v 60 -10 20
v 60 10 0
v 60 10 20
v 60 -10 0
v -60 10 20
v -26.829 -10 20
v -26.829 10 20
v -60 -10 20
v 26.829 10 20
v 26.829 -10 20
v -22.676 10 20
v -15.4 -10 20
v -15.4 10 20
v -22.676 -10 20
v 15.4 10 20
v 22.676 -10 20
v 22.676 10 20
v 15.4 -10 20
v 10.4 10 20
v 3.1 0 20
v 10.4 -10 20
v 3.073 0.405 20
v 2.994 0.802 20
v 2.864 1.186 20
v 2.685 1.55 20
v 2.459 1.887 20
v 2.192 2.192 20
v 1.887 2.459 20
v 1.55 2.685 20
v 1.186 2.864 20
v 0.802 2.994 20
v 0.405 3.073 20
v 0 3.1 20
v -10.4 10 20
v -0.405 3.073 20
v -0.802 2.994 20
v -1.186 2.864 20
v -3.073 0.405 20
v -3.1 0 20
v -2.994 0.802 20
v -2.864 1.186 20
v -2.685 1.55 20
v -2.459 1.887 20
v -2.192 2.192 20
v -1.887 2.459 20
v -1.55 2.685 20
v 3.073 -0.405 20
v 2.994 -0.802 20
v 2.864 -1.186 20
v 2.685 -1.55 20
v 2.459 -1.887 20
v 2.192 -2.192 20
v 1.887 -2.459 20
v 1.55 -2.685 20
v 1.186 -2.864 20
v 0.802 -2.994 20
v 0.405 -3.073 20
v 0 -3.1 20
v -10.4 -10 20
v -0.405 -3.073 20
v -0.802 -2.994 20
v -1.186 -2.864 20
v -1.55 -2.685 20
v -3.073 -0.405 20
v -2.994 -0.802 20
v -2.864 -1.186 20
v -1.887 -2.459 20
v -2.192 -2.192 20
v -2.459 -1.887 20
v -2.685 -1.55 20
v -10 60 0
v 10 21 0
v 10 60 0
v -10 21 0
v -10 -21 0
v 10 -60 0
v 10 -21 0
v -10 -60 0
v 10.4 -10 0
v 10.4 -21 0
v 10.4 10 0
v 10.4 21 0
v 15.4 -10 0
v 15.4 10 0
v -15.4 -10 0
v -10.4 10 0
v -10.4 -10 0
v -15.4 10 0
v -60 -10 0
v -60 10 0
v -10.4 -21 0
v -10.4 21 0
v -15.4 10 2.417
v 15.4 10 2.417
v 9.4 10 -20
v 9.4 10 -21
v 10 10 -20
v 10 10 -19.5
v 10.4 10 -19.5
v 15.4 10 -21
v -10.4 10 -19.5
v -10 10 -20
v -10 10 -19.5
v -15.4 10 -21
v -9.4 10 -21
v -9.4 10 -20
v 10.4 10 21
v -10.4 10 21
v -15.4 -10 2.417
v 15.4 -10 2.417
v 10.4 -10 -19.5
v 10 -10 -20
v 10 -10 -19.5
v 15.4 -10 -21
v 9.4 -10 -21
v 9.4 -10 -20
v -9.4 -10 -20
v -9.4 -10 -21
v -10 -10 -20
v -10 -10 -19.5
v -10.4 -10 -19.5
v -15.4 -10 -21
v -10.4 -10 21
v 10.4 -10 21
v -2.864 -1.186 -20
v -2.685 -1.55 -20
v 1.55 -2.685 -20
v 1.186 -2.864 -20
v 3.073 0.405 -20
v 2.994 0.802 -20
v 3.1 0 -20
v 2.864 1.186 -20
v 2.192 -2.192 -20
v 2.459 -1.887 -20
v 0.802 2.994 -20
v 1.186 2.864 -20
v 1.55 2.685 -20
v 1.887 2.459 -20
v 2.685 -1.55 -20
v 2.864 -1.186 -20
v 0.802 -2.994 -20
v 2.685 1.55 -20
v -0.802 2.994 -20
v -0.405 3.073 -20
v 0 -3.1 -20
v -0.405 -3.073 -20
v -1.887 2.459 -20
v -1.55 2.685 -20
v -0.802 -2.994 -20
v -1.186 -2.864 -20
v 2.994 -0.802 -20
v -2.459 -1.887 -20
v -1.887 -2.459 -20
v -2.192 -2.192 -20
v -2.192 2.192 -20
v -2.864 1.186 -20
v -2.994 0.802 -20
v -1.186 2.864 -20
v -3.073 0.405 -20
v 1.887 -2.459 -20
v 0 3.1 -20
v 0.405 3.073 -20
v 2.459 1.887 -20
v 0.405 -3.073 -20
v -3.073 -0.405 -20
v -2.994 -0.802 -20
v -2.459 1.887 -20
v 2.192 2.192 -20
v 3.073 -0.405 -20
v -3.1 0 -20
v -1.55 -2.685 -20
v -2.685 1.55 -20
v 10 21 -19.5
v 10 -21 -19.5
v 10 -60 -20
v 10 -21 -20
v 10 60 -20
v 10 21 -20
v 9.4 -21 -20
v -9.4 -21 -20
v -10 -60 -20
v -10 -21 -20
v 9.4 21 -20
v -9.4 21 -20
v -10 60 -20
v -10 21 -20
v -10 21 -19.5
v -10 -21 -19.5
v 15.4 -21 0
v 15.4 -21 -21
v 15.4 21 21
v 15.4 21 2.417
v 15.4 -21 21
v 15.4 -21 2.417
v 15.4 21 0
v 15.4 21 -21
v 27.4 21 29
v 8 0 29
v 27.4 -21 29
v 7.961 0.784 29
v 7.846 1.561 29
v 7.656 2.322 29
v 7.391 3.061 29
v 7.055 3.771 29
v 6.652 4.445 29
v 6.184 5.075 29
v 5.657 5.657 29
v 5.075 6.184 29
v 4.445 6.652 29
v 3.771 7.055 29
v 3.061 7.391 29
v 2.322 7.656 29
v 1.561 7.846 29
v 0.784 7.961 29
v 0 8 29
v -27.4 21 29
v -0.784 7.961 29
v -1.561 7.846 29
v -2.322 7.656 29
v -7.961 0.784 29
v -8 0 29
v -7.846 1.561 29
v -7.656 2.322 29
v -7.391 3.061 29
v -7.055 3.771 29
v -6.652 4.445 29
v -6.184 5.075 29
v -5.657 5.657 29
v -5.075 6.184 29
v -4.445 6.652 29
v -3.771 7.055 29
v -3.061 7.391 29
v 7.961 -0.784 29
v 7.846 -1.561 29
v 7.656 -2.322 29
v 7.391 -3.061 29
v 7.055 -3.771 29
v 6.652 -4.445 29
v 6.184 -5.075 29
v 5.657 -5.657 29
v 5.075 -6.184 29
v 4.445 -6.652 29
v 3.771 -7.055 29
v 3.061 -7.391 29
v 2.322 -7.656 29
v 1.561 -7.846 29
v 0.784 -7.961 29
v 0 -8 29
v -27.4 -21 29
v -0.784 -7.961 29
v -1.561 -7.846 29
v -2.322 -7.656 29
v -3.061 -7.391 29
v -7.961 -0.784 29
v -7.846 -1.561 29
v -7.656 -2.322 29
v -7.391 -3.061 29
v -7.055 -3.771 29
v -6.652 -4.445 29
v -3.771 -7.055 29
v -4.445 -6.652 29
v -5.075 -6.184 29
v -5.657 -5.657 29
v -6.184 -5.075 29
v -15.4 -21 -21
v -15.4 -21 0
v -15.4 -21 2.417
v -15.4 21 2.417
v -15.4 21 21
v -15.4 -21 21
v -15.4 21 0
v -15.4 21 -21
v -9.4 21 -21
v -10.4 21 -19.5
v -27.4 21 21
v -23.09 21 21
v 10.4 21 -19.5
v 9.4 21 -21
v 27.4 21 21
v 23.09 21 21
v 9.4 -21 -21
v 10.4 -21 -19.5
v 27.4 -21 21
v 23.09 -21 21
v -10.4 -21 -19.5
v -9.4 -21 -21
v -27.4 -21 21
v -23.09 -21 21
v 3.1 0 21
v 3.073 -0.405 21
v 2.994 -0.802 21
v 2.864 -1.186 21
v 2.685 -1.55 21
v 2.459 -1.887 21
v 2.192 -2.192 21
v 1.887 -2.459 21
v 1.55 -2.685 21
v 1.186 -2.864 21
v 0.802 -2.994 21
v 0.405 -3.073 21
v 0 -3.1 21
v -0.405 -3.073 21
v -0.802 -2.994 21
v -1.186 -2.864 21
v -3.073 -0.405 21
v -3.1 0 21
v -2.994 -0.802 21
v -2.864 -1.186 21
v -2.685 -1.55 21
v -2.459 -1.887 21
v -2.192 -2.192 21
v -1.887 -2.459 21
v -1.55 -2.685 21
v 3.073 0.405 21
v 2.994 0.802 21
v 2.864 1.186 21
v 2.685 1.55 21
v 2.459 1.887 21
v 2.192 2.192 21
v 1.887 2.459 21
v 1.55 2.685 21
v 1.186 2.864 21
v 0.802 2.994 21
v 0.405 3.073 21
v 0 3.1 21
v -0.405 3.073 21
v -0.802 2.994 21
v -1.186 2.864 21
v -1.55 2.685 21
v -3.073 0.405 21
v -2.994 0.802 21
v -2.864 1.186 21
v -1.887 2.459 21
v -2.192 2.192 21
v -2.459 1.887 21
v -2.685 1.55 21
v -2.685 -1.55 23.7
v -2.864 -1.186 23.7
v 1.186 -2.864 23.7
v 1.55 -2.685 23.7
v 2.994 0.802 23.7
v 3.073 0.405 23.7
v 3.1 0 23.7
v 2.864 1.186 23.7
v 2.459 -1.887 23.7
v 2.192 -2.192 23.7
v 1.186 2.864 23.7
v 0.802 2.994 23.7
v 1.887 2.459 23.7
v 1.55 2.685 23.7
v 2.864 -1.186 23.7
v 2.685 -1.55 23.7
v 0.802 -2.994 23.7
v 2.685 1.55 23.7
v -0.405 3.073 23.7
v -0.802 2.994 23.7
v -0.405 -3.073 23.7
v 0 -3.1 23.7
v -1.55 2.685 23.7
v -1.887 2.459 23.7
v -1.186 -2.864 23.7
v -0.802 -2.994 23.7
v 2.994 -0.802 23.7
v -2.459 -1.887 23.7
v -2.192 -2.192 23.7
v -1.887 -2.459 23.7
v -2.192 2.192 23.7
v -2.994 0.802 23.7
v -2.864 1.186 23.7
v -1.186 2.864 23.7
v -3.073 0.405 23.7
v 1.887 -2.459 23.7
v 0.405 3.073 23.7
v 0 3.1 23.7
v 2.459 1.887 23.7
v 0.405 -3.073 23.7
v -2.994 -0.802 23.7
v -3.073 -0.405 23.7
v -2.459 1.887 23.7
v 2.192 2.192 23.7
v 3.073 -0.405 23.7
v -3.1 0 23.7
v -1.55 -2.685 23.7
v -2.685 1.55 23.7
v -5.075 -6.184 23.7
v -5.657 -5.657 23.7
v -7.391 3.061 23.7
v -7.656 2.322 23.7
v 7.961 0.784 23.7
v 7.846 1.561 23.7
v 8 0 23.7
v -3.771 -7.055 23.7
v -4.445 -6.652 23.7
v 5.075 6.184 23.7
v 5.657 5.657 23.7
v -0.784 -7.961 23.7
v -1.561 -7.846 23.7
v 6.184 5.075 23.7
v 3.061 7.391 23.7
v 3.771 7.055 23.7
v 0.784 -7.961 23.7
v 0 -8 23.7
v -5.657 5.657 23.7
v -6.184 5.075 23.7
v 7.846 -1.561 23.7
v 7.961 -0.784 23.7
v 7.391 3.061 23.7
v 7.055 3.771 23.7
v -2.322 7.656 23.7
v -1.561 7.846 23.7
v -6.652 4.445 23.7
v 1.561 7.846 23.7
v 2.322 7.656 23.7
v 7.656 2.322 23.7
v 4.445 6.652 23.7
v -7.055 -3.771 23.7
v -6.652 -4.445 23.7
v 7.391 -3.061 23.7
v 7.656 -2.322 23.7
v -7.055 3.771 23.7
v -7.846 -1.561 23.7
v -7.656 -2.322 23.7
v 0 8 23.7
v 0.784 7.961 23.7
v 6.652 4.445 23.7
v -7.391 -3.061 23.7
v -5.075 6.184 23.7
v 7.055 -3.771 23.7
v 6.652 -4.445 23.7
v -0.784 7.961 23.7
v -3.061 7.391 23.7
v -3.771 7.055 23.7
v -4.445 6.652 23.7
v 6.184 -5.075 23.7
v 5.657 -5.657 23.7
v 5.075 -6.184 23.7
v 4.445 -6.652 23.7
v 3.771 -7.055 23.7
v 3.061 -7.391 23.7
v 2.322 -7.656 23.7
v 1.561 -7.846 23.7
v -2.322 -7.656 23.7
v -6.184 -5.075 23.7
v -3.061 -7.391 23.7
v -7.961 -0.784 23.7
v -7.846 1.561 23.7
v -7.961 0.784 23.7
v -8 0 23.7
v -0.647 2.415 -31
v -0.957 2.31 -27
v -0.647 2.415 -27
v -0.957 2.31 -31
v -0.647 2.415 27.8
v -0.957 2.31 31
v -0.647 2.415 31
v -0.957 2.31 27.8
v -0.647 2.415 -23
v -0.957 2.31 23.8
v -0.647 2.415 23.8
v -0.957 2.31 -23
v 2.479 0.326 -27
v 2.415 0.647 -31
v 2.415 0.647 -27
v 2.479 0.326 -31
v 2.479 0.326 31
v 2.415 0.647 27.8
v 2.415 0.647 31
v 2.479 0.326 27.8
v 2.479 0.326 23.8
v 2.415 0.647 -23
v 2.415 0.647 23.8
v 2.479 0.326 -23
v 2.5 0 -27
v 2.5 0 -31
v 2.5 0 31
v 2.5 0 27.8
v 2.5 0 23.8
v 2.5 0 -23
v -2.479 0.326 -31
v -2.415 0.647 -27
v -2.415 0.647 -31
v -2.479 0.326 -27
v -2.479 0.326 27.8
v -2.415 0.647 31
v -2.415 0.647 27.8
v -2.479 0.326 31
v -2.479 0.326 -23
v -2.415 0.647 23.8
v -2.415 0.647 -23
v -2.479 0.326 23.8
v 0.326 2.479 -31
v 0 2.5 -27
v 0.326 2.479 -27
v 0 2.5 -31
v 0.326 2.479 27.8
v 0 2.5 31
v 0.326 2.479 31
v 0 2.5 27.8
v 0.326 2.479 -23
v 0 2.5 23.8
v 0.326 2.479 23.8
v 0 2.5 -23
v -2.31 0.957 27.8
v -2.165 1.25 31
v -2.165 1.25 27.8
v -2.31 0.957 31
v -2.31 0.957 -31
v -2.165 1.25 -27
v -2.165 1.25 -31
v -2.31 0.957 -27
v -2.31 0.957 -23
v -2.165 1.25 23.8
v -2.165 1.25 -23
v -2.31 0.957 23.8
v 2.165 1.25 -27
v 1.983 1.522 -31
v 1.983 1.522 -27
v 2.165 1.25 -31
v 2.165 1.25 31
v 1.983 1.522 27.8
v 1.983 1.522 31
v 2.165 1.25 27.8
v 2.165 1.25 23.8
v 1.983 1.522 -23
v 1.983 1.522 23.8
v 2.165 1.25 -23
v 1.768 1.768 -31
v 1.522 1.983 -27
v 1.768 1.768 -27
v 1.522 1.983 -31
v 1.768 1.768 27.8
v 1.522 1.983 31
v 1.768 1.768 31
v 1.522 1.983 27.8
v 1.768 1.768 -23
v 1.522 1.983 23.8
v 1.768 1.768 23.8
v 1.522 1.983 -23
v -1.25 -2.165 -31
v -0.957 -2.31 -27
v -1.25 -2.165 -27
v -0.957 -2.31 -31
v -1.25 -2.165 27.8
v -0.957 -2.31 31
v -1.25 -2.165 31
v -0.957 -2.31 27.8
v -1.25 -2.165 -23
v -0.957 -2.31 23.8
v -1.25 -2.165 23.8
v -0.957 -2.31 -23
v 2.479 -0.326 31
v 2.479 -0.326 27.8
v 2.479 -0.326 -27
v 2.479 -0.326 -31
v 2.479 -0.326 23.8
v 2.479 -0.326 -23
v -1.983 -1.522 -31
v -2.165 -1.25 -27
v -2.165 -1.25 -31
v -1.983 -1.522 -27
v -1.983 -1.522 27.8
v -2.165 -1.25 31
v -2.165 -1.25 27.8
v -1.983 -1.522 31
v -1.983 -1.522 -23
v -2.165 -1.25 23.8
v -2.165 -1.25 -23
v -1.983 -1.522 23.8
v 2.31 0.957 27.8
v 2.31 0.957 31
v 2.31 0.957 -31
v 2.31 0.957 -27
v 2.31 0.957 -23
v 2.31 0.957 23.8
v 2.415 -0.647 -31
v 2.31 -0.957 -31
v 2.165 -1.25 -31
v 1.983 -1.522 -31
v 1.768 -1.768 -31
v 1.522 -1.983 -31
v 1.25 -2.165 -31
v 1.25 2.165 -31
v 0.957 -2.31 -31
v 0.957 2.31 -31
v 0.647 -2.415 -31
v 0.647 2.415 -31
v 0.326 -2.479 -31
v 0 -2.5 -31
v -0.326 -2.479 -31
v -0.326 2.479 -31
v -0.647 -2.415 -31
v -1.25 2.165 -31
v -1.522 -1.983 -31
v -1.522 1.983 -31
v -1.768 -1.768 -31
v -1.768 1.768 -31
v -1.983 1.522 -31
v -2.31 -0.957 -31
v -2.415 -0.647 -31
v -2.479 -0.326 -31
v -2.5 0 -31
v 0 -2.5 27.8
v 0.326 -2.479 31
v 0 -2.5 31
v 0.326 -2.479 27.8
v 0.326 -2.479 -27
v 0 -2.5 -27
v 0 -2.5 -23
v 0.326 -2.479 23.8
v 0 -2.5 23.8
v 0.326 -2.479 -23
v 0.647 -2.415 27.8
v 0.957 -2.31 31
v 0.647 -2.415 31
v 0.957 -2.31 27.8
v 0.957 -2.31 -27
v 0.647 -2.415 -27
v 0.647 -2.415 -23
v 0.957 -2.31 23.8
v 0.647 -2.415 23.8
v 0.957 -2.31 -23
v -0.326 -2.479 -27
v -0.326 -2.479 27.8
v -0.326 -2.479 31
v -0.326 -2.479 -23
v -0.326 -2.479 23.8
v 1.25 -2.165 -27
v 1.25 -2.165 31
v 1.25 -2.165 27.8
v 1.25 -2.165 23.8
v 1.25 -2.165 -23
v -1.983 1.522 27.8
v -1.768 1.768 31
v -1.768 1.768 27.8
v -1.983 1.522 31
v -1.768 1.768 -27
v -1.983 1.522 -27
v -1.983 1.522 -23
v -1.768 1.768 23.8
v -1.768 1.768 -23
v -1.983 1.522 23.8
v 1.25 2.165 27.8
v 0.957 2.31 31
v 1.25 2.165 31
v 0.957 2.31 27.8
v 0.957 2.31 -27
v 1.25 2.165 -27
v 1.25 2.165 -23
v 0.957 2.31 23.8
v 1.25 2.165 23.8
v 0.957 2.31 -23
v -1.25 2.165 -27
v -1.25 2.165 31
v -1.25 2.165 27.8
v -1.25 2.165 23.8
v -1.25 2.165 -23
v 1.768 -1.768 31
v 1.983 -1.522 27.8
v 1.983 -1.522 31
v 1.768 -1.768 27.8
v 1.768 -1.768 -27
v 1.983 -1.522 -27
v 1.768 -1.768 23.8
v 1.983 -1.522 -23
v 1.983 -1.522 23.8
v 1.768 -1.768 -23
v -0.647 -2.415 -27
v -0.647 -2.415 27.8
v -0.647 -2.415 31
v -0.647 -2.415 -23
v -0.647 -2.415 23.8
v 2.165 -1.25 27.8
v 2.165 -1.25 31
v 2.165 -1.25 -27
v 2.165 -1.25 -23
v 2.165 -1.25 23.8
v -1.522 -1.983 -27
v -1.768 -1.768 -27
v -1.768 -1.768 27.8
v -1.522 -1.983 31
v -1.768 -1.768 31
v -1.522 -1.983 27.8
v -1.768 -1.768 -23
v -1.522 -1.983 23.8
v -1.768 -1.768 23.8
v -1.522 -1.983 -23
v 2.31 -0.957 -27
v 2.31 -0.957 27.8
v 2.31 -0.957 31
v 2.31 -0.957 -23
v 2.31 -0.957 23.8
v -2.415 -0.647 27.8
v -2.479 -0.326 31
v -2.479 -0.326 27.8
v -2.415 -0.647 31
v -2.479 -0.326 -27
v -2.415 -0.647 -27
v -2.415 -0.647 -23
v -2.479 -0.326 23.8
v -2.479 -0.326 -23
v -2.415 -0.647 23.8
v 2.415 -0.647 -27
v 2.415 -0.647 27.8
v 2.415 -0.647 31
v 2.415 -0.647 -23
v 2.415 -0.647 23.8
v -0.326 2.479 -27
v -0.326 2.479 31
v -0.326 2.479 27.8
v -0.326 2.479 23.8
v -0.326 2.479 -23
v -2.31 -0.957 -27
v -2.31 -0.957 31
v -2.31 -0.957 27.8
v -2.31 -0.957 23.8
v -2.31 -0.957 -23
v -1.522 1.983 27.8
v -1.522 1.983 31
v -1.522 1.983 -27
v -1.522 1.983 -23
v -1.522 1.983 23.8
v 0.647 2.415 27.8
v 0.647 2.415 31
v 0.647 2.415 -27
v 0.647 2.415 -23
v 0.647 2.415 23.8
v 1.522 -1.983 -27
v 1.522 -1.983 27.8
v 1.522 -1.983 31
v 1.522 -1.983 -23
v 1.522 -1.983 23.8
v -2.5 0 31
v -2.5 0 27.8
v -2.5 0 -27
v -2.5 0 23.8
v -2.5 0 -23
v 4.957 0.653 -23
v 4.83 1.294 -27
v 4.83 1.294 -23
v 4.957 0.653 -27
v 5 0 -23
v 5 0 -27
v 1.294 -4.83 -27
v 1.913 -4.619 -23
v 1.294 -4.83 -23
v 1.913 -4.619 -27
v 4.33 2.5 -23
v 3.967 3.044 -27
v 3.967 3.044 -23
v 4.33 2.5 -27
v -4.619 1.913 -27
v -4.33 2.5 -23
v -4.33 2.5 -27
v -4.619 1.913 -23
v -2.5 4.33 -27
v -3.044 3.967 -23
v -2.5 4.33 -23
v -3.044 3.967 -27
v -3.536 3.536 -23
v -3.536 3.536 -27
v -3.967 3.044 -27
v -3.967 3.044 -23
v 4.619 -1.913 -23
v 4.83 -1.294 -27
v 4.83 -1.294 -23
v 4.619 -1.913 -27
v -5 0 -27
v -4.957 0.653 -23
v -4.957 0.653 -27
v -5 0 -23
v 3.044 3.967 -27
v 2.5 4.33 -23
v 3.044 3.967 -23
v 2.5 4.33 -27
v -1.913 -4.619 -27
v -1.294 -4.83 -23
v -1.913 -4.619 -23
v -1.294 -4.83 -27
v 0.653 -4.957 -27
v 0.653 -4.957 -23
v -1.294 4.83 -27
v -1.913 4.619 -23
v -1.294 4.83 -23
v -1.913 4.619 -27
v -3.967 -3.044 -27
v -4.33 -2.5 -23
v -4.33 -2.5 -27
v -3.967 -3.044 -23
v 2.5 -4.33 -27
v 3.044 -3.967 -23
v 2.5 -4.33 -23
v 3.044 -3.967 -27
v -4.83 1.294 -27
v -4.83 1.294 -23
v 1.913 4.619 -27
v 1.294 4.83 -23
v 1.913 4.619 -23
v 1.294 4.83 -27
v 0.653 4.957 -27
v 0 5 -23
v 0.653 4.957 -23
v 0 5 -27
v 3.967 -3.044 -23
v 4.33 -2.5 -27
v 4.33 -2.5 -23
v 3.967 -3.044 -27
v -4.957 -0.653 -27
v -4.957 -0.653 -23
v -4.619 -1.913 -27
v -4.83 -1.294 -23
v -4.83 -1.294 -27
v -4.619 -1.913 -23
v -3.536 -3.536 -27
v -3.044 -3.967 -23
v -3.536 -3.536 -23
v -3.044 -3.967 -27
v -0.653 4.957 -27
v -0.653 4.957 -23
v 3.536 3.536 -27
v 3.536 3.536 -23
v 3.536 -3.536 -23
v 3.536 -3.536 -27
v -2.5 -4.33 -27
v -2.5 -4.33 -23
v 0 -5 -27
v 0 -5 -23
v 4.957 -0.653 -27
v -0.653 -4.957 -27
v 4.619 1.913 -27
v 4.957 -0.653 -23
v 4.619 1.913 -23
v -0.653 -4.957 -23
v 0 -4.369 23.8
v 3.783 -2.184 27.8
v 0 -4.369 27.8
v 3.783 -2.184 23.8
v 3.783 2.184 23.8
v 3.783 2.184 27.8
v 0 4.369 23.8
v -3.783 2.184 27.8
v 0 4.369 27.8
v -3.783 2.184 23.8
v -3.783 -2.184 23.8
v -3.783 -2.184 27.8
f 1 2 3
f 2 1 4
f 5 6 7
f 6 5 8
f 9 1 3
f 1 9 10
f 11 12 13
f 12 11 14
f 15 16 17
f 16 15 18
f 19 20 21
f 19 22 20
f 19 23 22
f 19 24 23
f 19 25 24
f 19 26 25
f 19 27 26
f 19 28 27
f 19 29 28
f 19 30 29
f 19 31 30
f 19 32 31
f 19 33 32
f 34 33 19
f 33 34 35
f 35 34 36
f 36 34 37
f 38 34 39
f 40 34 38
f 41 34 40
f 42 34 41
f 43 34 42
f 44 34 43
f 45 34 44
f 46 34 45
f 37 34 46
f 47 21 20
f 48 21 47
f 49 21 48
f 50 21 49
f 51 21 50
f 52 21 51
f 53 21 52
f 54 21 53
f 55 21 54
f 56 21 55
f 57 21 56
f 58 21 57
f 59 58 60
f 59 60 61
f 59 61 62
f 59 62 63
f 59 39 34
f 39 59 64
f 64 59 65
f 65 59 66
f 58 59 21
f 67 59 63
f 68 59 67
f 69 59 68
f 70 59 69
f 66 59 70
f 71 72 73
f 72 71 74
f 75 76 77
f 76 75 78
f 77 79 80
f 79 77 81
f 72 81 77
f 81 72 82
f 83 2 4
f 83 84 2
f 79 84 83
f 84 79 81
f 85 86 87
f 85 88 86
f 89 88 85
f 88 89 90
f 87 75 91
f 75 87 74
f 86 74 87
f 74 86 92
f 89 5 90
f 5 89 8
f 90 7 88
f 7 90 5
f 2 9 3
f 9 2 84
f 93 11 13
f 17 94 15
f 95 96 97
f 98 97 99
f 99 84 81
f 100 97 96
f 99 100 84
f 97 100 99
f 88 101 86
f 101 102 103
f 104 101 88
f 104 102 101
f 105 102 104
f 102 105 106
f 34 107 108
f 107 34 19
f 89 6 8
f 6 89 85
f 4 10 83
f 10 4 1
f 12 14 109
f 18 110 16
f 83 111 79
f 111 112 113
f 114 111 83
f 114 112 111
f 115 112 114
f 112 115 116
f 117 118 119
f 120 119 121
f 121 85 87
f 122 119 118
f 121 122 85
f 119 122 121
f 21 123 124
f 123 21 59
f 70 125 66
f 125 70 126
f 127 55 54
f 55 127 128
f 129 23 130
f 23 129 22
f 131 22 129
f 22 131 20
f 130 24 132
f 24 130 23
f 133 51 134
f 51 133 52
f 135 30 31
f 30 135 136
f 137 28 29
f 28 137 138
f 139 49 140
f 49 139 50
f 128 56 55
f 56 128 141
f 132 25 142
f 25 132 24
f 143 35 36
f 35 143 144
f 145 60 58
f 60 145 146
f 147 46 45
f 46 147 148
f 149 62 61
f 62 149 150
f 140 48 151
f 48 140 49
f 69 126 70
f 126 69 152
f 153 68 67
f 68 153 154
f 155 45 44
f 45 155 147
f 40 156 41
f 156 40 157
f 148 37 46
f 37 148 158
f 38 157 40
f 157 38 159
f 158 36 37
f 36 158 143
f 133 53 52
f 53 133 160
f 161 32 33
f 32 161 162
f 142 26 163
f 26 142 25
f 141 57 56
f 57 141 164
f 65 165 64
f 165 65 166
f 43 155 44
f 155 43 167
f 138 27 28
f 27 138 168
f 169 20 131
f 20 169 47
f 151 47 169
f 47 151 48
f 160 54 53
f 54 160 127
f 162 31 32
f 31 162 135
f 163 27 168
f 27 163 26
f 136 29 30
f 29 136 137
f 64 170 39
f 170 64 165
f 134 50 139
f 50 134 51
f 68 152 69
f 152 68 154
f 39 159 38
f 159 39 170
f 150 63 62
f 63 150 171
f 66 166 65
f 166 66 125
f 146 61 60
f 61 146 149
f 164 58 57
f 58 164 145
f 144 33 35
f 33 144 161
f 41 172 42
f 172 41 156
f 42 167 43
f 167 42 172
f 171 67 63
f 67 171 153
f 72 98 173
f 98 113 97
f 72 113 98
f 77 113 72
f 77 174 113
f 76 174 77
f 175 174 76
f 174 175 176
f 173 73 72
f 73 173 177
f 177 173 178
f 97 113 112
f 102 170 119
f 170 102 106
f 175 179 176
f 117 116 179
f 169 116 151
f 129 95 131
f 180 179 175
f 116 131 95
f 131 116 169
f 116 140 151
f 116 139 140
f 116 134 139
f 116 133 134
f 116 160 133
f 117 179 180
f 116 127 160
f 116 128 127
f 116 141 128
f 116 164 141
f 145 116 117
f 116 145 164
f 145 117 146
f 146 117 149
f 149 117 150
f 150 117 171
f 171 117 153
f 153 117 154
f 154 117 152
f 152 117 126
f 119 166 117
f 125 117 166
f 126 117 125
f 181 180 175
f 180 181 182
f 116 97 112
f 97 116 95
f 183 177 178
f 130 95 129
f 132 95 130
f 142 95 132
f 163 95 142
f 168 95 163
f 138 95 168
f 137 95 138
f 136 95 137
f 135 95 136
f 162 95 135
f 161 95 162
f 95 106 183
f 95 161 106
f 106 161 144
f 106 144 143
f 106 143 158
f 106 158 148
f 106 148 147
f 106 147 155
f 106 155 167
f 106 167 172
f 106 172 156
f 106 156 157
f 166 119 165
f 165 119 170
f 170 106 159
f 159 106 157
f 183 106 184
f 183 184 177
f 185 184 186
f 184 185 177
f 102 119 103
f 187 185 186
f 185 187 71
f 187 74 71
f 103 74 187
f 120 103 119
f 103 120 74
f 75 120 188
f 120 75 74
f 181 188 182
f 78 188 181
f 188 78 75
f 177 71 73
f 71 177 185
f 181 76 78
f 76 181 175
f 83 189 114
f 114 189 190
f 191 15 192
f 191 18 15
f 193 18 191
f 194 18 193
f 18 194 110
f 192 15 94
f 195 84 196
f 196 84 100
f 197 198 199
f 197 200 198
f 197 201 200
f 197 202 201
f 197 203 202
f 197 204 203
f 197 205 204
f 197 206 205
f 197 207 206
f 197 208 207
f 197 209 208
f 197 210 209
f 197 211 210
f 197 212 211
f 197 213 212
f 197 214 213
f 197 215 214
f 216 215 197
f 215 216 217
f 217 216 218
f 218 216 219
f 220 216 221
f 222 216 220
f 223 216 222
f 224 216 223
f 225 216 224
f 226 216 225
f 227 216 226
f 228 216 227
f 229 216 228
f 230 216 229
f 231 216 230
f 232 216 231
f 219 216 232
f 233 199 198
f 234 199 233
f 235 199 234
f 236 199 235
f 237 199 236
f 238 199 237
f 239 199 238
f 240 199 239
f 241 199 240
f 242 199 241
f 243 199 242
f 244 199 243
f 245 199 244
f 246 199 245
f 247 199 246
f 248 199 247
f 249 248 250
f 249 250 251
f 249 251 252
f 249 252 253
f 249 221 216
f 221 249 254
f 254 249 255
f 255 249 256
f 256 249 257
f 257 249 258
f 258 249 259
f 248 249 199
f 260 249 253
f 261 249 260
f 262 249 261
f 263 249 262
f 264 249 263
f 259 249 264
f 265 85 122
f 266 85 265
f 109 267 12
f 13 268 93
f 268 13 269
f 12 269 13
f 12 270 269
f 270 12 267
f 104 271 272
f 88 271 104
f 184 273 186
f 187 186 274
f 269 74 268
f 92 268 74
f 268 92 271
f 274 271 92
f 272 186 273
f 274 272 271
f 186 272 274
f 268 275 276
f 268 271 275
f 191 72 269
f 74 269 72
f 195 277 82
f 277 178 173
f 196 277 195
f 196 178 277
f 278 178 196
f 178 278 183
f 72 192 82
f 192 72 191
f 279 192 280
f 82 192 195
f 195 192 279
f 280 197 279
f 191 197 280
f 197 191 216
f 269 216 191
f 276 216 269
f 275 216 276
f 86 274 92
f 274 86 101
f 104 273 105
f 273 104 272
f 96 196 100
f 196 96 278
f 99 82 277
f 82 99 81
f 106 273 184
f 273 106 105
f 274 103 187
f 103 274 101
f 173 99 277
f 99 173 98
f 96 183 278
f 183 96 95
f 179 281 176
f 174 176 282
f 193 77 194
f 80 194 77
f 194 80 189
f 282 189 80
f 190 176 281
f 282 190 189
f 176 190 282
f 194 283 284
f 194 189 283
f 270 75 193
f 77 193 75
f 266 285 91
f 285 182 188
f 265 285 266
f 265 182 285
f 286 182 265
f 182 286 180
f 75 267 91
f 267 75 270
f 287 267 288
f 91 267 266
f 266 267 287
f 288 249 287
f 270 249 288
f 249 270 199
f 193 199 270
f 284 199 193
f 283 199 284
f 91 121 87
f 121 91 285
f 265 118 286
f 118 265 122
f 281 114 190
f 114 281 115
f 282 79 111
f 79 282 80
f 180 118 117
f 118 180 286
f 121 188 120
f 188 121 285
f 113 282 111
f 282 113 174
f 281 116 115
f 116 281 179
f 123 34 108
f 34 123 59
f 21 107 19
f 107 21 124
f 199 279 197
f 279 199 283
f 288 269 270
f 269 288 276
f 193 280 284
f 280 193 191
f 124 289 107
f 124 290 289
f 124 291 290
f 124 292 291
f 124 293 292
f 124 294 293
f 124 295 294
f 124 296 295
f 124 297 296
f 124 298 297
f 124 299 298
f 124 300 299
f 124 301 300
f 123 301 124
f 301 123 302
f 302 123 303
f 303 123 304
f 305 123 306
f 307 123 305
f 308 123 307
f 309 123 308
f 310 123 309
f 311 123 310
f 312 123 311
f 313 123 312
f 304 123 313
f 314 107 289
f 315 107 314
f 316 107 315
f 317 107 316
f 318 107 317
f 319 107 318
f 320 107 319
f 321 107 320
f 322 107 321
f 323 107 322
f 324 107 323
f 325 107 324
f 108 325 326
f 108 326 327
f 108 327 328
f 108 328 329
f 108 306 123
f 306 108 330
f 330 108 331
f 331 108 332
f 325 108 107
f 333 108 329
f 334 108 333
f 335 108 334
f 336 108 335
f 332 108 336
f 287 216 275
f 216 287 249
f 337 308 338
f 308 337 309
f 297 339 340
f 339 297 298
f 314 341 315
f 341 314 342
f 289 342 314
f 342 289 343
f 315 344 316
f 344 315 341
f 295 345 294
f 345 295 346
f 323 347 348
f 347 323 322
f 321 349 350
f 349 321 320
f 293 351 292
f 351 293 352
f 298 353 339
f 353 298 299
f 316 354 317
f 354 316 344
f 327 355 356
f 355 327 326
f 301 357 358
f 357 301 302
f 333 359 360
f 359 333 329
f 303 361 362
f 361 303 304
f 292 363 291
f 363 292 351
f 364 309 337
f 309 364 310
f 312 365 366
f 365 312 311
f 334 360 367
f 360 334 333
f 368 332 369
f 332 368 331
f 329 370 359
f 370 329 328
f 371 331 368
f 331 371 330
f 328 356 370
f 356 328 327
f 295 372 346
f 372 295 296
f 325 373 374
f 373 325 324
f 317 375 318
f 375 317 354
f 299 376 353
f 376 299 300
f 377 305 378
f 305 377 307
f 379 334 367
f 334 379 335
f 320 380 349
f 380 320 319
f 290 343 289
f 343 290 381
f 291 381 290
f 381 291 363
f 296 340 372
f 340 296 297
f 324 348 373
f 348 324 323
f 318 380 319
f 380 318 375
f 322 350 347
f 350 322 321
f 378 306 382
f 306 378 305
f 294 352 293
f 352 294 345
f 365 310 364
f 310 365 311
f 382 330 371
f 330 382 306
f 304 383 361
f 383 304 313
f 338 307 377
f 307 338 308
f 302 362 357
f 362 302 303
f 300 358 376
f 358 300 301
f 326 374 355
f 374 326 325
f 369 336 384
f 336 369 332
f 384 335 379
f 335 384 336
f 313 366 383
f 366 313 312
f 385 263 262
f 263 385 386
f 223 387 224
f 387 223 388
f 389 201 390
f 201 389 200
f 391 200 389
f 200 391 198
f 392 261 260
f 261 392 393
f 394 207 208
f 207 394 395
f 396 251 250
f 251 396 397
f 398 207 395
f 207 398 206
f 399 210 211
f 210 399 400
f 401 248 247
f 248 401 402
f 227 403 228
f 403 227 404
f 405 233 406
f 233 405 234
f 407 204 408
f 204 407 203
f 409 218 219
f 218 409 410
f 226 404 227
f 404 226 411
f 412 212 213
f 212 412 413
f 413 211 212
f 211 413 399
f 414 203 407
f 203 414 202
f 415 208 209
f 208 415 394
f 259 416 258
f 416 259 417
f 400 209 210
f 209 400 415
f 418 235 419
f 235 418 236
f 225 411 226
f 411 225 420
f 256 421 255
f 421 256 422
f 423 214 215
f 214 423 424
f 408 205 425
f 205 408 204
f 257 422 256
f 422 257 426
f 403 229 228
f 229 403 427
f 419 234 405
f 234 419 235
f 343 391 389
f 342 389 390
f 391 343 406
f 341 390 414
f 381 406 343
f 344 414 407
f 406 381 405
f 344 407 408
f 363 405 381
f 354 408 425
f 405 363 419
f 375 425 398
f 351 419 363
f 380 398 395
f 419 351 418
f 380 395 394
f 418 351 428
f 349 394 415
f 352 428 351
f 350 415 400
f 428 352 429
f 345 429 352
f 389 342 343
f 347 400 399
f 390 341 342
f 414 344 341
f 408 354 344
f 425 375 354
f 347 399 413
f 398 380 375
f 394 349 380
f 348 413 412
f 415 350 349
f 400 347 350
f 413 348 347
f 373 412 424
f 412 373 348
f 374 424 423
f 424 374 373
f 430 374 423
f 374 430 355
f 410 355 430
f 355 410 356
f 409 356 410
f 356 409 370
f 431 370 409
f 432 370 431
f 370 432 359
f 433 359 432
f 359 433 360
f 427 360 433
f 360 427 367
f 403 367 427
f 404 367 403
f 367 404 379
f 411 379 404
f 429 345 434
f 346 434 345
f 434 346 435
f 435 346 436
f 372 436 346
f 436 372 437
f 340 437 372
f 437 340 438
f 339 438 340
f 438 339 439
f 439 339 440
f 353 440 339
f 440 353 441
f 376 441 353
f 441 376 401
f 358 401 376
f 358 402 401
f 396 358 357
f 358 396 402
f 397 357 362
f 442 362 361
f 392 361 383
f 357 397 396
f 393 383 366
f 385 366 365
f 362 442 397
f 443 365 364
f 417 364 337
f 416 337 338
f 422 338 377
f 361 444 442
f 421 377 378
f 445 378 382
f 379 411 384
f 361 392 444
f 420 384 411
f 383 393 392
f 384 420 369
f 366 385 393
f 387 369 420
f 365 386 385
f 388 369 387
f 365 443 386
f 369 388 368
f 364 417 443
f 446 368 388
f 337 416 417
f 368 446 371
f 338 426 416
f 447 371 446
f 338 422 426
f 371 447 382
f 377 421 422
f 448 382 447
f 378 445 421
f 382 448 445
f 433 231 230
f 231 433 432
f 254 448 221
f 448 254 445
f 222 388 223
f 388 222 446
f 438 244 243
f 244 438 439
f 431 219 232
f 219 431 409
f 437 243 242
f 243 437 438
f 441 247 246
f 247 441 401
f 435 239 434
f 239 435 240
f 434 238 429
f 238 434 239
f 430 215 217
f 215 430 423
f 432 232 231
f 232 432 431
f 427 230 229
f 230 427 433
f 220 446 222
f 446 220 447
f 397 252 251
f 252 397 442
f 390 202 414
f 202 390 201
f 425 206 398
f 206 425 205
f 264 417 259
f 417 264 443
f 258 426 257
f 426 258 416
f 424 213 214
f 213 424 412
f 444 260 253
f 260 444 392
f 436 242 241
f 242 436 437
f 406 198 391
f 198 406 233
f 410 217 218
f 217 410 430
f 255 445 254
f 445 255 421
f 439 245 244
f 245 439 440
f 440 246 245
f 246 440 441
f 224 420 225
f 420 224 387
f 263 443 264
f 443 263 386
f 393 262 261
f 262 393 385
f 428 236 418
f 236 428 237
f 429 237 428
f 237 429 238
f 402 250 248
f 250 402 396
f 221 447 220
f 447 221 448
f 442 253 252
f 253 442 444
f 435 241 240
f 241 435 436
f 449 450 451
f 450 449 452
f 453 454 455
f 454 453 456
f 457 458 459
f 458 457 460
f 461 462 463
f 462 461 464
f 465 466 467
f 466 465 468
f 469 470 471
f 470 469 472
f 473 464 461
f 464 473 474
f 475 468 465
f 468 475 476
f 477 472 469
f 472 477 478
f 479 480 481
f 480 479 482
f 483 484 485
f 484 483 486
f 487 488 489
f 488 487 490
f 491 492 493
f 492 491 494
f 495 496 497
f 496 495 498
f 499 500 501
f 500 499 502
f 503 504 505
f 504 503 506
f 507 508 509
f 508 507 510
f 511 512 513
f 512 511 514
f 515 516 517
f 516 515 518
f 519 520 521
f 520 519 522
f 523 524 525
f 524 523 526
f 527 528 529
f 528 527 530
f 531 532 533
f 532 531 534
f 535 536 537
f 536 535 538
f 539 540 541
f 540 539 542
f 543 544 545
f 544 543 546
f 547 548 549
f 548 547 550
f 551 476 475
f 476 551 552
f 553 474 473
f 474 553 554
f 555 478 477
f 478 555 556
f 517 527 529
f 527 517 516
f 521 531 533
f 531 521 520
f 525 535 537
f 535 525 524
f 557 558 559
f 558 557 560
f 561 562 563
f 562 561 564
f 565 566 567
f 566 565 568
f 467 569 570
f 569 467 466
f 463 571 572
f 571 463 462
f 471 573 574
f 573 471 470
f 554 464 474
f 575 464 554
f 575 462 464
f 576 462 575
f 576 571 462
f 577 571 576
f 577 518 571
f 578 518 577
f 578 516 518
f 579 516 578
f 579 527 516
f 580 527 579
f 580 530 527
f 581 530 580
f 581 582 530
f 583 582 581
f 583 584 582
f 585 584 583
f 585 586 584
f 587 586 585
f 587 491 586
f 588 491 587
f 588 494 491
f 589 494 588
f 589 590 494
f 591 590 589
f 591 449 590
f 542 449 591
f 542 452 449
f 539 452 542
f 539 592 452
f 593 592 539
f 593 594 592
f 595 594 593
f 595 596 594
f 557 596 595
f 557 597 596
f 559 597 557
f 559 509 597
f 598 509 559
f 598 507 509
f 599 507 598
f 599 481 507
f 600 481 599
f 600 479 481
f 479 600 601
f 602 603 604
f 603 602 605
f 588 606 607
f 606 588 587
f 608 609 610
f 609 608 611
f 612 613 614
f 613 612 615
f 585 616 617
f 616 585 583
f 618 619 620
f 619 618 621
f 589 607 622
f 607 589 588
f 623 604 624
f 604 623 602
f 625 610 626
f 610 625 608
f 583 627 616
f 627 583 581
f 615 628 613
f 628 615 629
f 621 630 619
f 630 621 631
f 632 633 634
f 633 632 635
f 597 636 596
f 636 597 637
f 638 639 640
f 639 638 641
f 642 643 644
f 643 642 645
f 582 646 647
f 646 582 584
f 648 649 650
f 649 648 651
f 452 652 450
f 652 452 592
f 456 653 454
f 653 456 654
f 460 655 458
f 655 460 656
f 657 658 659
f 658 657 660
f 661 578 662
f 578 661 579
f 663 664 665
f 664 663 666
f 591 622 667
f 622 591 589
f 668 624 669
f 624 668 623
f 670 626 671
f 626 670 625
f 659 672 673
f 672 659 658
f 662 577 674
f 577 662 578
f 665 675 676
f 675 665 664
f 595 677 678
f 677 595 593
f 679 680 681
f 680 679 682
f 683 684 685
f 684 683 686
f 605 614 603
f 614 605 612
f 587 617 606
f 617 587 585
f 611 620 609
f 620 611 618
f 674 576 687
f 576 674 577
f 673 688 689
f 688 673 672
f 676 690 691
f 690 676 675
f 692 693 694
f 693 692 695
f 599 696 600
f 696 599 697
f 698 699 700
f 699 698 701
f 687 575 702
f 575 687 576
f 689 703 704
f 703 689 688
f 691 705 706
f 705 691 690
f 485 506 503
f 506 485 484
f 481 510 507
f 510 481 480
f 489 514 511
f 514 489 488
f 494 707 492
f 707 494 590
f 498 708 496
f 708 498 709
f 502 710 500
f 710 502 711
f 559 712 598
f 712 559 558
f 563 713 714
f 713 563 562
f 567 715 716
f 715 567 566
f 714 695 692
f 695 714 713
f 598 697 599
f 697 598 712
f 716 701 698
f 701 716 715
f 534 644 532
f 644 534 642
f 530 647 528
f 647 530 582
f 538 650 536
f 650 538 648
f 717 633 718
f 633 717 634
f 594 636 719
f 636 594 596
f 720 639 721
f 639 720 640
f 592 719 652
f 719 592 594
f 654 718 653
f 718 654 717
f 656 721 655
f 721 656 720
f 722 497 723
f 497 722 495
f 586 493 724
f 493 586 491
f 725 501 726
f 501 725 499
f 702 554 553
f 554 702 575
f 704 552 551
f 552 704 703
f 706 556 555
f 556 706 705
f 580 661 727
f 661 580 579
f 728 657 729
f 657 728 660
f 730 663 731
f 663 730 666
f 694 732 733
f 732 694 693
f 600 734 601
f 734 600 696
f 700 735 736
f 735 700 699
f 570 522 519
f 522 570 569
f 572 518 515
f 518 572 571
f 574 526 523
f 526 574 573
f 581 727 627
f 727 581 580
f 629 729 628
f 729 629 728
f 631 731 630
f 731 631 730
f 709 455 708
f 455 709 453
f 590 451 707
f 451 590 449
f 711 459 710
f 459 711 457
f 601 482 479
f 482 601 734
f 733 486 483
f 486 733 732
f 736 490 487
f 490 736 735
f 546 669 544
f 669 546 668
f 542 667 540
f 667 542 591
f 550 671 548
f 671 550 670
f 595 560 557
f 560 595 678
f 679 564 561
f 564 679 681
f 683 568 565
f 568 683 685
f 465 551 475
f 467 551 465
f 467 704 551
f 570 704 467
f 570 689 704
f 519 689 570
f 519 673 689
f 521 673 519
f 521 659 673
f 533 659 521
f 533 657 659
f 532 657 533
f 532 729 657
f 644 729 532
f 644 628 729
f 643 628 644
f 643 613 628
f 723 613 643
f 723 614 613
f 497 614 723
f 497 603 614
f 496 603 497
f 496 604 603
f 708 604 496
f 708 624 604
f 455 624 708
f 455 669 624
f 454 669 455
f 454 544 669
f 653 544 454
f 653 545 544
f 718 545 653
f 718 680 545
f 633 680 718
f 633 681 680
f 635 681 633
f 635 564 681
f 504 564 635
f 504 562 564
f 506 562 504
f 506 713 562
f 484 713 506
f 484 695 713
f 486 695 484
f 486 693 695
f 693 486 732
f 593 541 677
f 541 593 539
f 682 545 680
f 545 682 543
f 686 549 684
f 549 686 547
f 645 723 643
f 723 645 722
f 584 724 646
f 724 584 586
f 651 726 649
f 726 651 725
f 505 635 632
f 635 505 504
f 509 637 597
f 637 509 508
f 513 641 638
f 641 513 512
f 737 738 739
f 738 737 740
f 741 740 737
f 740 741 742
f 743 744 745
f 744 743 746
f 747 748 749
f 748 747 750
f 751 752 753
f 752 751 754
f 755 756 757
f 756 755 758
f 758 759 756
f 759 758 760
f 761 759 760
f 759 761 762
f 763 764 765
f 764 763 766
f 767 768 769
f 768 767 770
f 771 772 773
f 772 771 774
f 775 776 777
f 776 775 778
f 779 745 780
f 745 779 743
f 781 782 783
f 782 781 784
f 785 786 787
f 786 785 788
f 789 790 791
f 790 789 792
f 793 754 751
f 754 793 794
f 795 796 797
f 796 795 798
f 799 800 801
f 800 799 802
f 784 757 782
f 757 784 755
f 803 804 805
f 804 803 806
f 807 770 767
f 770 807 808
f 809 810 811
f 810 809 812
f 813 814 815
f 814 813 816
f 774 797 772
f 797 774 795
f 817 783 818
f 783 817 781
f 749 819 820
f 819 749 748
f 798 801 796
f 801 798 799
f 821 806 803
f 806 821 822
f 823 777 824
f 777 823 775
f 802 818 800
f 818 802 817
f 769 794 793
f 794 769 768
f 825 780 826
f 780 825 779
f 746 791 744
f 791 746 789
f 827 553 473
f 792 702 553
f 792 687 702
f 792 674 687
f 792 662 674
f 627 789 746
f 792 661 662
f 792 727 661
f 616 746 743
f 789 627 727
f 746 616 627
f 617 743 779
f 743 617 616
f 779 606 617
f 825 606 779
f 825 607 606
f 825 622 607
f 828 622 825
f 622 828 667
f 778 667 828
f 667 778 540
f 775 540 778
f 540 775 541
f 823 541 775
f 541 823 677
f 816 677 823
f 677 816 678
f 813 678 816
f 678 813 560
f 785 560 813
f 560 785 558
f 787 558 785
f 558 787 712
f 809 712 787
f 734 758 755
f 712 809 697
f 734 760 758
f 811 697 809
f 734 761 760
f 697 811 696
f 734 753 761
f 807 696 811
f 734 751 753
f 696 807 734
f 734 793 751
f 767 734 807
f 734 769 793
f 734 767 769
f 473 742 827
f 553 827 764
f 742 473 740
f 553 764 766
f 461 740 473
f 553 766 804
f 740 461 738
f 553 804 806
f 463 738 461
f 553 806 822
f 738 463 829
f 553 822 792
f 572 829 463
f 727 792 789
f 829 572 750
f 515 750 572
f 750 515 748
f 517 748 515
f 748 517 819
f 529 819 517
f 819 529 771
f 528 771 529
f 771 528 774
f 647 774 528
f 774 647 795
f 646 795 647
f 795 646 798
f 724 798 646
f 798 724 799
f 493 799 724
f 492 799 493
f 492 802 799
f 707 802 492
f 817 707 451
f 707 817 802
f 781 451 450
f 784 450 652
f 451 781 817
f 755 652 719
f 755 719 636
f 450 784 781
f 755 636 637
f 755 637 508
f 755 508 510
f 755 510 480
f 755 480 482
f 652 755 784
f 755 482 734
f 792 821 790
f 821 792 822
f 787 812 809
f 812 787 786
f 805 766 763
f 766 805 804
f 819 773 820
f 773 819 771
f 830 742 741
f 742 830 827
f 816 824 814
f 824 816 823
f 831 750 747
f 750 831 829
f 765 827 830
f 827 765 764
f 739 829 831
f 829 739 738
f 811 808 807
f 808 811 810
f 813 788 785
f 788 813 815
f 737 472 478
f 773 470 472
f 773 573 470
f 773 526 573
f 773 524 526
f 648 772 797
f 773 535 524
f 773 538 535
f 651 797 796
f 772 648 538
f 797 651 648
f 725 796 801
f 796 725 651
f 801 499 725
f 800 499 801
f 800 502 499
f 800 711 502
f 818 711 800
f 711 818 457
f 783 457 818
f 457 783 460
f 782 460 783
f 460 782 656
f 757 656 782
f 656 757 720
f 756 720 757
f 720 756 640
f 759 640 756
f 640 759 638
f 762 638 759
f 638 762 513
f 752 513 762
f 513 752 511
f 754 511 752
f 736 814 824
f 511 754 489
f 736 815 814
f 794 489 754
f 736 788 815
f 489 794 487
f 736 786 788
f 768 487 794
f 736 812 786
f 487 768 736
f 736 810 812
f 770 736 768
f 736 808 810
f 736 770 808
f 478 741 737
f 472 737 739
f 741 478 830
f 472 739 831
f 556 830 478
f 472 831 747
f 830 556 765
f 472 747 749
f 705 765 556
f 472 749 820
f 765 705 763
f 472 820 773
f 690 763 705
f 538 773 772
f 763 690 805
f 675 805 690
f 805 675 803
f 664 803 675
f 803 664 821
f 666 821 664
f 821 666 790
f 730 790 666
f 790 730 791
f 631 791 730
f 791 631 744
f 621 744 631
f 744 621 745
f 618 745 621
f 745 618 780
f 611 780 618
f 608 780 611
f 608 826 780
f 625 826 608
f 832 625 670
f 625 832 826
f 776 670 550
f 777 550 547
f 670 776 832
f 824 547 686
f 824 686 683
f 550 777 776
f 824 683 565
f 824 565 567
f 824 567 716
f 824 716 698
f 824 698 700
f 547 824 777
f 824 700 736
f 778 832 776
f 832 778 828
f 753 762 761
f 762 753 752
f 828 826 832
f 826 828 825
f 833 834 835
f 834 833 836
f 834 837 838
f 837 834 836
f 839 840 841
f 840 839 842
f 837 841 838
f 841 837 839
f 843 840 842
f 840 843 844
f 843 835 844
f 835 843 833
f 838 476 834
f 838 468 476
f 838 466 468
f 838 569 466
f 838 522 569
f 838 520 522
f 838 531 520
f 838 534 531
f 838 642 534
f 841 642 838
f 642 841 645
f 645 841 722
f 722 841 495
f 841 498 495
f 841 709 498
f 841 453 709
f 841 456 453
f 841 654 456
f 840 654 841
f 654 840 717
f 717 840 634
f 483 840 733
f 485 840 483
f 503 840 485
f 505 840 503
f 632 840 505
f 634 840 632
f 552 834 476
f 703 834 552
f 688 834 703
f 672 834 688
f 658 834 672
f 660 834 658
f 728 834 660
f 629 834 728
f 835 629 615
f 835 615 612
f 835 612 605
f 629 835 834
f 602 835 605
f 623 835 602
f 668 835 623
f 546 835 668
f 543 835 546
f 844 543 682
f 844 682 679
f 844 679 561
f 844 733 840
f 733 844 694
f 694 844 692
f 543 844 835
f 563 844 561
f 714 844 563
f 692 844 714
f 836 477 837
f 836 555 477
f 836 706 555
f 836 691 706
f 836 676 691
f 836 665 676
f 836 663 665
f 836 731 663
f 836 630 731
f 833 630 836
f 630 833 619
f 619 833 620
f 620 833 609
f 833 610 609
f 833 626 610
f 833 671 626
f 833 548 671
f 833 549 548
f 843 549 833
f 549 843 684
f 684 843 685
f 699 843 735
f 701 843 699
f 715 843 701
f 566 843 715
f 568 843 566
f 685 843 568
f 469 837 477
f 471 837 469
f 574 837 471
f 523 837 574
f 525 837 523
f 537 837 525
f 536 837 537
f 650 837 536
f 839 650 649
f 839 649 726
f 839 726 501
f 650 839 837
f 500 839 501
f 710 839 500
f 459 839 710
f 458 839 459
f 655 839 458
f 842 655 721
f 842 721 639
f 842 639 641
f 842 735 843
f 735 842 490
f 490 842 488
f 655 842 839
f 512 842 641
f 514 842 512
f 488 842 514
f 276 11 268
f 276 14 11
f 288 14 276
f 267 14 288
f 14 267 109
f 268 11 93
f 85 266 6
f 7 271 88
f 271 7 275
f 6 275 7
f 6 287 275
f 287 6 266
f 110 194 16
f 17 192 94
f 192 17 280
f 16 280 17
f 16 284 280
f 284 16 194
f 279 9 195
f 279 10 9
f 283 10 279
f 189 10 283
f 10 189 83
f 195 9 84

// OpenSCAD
// Candidate v1.2: two continuous X-end corner walls.
//
// Base: accepted v0.7 eaves12 geometry. v0.9/v1.0/v1.1 are not imported.
// The prior four separated front/back plates are replaced by two continuous
// solids that run through the available front/back envelope y=-21..+21.
// Their X ranges stay outside the blue lower tube's x=-10..+10 envelope.

use <../perpendicular-u-joint-guard-v0.7/perpendicular_double_u_guard.scad>;

$fn = 48;
PART = "candidate_iso";

// Explicit v0.7 interface values; `use` imports modules, not top-level vars.
roof_x_outer = 27.4;       // accepted eaves12 roof: -27.4..+27.4
side_wall_x_outer = 15.4;  // existing side-wall outer edge
side_wall_x_inner = 10.4;  // existing side-wall inner edge
blue_tube_x_outer = 10.0;  // actual 20 mm blue tube half-width
wall_y_min = -21.0;
wall_y_max = 21.0;
wall_depth_y = wall_y_max - wall_y_min; // 42 mm continuous depth
roof_z_bottom = 21.0;
roof_z_top = 29.0;
landing_z = 0.0;           // blue lower tube top / side-wall lower target
roof_overlap_x = 1.0;
side_overlap_x = 1.0;

// v0.7 bottom retaining-hook contract.  These values are copied explicitly
// for the review/assertions; the actual printable hook remains inside the
// imported double_u_clip() and is not moved by v1.2.
hook_height_z = 1.5;
u_bottom_z = -21.0;
hook_top_z = u_bottom_z + hook_height_z; // -19.5
front_plate_y0 = 10.0;
front_plate_y1 = 21.0;
hook_depth_x = 3.5;
left_hook_center_x = -13.65;
right_hook_center_x = 13.65;
hook_center_z = u_bottom_z + hook_height_z / 2; // -20.25

assert(wall_depth_y == 42, "连续墙必须贯通 y=-21..+21");
assert(landing_z == 0,
       "蓝色下方方管上表面及侧墙目标高度必须是 z=0");
assert(roof_overlap_x > 0 && side_overlap_x > 0,
       "连续墙必须与屋檐和侧墙都有正重叠");
assert(side_wall_x_outer - side_overlap_x > blue_tube_x_outer,
       "连续墙下端不能进入蓝色方管 x=-10..+10 包络");
assert(hook_height_z == 1.5 && u_bottom_z == -21 && hook_top_z == -19.5,
       "底部内扣必须保持 z=-21..-19.5 的 1.5 mm");
assert(hook_top_z < 0 && landing_z == 0,
       "底部卡脚不得进入 z=0 以上的连续墙区域");

// One XZ trapezoid extruded over the whole front/back envelope.  This is a
// broad continuous wall/angle block, not a narrow decorative rib.  The
// 1 mm intervals at the roof and side-wall ends create positive overlap.
module continuous_wall_xz(points) {
    translate([0, (wall_y_min + wall_y_max) / 2, 0])
        rotate([90, 0, 0])
            linear_extrude(height = wall_depth_y,
                           center = true,
                           convexity = 10)
                polygon(points = points);
}

module continuous_neg_x_wall() {
    continuous_wall_xz([
        [-roof_x_outer, roof_z_bottom],
        [-roof_x_outer, roof_z_top],
        [-roof_x_outer + roof_overlap_x, roof_z_top],
        [-side_wall_x_outer + side_overlap_x, landing_z],
        [-side_wall_x_outer, landing_z]
    ]);
}

module continuous_pos_x_wall() {
    continuous_wall_xz([
        [roof_x_outer, roof_z_bottom],
        [roof_x_outer, roof_z_top],
        [roof_x_outer - roof_overlap_x, roof_z_top],
        [side_wall_x_outer - side_overlap_x, landing_z],
        [side_wall_x_outer, landing_z]
    ]);
}

module continuous_corner_walls() {
    union() {
        continuous_neg_x_wall();
        continuous_pos_x_wall();
    }
}

module candidate_print_solid() {
    // Reapply the true Z through-hole after the complete continuous-wall
    // union. The round v0.7 nut pocket remains part of this same relief.
    difference() {
        union() {
            double_u_clip();
            continuous_corner_walls();
        }
        vertical_screw_relief();
    }
}

module candidate_clip() {
    candidate_print_solid();
}

module candidate_assembly_iso() {
    upper_long_tube();
    lower_cross_tube();
    color([0.96, 0.39, 0.08]) double_u_clip();
    color([0.84, 0.12, 0.08]) continuous_neg_x_wall();
    color([0.12, 0.55, 0.78]) continuous_pos_x_wall();
    vertical_joint_screw();
}

module candidate_front_xz() {
    lower_cross_tube();
    color([0.96, 0.39, 0.08]) double_u_clip();
    color([0.84, 0.12, 0.08]) continuous_neg_x_wall();
    color([0.12, 0.55, 0.78]) continuous_pos_x_wall();
    vertical_joint_screw();
}

module candidate_back_xz() {
    lower_cross_tube();
    color([0.96, 0.39, 0.08]) double_u_clip();
    color([0.84, 0.12, 0.08]) continuous_neg_x_wall();
    color([0.12, 0.55, 0.78]) continuous_pos_x_wall();
    vertical_joint_screw();
}

module candidate_top_slice() {
    // z=-0.5..2.5 slice exposes the two walls' continuous y=-21..+21 span,
    // the blue tube, the open x=-10..+10 tube envelope, and the bore.
    slice_box = 200;
    color([0.28, 0.45, 0.78])
        intersection() {
            lower_cross_tube();
            translate([-slice_box / 2, -slice_box / 2, -0.5])
                cube([slice_box, slice_box, 3.0]);
        }
    color([0.96, 0.39, 0.08])
        intersection() {
            double_u_clip();
            translate([-slice_box / 2, -slice_box / 2, -0.5])
                cube([slice_box, slice_box, 3.0]);
        }
    color([0.84, 0.12, 0.08])
        intersection() {
            continuous_neg_x_wall();
            translate([-slice_box / 2, -slice_box / 2, -0.5])
                cube([slice_box, slice_box, 3.0]);
        }
    color([0.12, 0.55, 0.78])
        intersection() {
            continuous_pos_x_wall();
            translate([-slice_box / 2, -slice_box / 2, -0.5])
                cube([slice_box, slice_box, 3.0]);
        }
}

module candidate_bottom_view() {
    // Lower slice: shows the two lower U sides/hooks and the unfilled blue
    // tube path. The screw bore is still a true Z-axis opening in the final.
    slice_box = 200;
    color([0.96, 0.39, 0.08])
        intersection() {
            candidate_print_solid();
            translate([-slice_box / 2, -slice_box / 2, -21.5])
                cube([slice_box, slice_box, 3.0]);
        }
}

module candidate_hook_check() {
    // Detail only: crop the actual +Y front U plate and blue lower tube to
    // z=-22..-17 so the 1.5 mm lower hook is visible at useful scale.
    detail_box = 200;
    detail_z0 = -22;
    detail_h = 5;
    detail_y0 = 8;
    detail_ydepth = 15;
    intersection() {
        lower_cross_tube();
        translate([-detail_box / 2, detail_y0, detail_z0])
            cube([detail_box, detail_ydepth, detail_h]);
    }
    color([0.96, 0.39, 0.08])
        intersection() {
            u_plate(front_plate_y0, front_plate_y1);
            translate([-detail_box / 2, detail_y0, detail_z0])
                cube([detail_box, detail_ydepth, detail_h]);
        }
    // Highlight the exact imported hook volumes in green; these boxes occupy
    // the same coordinates as the v0.7 hook geometry inside u_plate().
    color([0.20, 0.78, 0.20])
        intersection() {
            union() {
                translate([left_hook_center_x, (front_plate_y0 + front_plate_y1) / 2, hook_center_z])
                    cube([hook_depth_x, front_plate_y1 - front_plate_y0, hook_height_z], center = true);
                translate([right_hook_center_x, (front_plate_y0 + front_plate_y1) / 2, hook_center_z])
                    cube([hook_depth_x, front_plate_y1 - front_plate_y0, hook_height_z], center = true);
            }
            translate([-detail_box / 2, detail_y0, detail_z0])
                cube([detail_box, detail_ydepth, detail_h]);
        }
}

module candidate_hole_section() {
    // y=0 centre section: the centre passage is intentionally open below the
    // roof, while the final Z bore and round nut pocket are visible in the
    // remaining top beam.
    intersection() {
        candidate_print_solid();
        translate([-100, -0.4, -100]) cube([200, 0.8, 200]);
    }
}

if (PART == "candidate_clip") {
    candidate_clip();
} else if (PART == "candidate_front_xz") {
    candidate_front_xz();
} else if (PART == "candidate_back_xz") {
    candidate_back_xz();
} else if (PART == "candidate_top_slice") {
    candidate_top_slice();
} else if (PART == "candidate_bottom_view") {
    candidate_bottom_view();
} else if (PART == "candidate_hook_check") {
    candidate_hook_check();
} else if (PART == "candidate_hole_section") {
    candidate_hole_section();
} else {
    candidate_assembly_iso();
}
